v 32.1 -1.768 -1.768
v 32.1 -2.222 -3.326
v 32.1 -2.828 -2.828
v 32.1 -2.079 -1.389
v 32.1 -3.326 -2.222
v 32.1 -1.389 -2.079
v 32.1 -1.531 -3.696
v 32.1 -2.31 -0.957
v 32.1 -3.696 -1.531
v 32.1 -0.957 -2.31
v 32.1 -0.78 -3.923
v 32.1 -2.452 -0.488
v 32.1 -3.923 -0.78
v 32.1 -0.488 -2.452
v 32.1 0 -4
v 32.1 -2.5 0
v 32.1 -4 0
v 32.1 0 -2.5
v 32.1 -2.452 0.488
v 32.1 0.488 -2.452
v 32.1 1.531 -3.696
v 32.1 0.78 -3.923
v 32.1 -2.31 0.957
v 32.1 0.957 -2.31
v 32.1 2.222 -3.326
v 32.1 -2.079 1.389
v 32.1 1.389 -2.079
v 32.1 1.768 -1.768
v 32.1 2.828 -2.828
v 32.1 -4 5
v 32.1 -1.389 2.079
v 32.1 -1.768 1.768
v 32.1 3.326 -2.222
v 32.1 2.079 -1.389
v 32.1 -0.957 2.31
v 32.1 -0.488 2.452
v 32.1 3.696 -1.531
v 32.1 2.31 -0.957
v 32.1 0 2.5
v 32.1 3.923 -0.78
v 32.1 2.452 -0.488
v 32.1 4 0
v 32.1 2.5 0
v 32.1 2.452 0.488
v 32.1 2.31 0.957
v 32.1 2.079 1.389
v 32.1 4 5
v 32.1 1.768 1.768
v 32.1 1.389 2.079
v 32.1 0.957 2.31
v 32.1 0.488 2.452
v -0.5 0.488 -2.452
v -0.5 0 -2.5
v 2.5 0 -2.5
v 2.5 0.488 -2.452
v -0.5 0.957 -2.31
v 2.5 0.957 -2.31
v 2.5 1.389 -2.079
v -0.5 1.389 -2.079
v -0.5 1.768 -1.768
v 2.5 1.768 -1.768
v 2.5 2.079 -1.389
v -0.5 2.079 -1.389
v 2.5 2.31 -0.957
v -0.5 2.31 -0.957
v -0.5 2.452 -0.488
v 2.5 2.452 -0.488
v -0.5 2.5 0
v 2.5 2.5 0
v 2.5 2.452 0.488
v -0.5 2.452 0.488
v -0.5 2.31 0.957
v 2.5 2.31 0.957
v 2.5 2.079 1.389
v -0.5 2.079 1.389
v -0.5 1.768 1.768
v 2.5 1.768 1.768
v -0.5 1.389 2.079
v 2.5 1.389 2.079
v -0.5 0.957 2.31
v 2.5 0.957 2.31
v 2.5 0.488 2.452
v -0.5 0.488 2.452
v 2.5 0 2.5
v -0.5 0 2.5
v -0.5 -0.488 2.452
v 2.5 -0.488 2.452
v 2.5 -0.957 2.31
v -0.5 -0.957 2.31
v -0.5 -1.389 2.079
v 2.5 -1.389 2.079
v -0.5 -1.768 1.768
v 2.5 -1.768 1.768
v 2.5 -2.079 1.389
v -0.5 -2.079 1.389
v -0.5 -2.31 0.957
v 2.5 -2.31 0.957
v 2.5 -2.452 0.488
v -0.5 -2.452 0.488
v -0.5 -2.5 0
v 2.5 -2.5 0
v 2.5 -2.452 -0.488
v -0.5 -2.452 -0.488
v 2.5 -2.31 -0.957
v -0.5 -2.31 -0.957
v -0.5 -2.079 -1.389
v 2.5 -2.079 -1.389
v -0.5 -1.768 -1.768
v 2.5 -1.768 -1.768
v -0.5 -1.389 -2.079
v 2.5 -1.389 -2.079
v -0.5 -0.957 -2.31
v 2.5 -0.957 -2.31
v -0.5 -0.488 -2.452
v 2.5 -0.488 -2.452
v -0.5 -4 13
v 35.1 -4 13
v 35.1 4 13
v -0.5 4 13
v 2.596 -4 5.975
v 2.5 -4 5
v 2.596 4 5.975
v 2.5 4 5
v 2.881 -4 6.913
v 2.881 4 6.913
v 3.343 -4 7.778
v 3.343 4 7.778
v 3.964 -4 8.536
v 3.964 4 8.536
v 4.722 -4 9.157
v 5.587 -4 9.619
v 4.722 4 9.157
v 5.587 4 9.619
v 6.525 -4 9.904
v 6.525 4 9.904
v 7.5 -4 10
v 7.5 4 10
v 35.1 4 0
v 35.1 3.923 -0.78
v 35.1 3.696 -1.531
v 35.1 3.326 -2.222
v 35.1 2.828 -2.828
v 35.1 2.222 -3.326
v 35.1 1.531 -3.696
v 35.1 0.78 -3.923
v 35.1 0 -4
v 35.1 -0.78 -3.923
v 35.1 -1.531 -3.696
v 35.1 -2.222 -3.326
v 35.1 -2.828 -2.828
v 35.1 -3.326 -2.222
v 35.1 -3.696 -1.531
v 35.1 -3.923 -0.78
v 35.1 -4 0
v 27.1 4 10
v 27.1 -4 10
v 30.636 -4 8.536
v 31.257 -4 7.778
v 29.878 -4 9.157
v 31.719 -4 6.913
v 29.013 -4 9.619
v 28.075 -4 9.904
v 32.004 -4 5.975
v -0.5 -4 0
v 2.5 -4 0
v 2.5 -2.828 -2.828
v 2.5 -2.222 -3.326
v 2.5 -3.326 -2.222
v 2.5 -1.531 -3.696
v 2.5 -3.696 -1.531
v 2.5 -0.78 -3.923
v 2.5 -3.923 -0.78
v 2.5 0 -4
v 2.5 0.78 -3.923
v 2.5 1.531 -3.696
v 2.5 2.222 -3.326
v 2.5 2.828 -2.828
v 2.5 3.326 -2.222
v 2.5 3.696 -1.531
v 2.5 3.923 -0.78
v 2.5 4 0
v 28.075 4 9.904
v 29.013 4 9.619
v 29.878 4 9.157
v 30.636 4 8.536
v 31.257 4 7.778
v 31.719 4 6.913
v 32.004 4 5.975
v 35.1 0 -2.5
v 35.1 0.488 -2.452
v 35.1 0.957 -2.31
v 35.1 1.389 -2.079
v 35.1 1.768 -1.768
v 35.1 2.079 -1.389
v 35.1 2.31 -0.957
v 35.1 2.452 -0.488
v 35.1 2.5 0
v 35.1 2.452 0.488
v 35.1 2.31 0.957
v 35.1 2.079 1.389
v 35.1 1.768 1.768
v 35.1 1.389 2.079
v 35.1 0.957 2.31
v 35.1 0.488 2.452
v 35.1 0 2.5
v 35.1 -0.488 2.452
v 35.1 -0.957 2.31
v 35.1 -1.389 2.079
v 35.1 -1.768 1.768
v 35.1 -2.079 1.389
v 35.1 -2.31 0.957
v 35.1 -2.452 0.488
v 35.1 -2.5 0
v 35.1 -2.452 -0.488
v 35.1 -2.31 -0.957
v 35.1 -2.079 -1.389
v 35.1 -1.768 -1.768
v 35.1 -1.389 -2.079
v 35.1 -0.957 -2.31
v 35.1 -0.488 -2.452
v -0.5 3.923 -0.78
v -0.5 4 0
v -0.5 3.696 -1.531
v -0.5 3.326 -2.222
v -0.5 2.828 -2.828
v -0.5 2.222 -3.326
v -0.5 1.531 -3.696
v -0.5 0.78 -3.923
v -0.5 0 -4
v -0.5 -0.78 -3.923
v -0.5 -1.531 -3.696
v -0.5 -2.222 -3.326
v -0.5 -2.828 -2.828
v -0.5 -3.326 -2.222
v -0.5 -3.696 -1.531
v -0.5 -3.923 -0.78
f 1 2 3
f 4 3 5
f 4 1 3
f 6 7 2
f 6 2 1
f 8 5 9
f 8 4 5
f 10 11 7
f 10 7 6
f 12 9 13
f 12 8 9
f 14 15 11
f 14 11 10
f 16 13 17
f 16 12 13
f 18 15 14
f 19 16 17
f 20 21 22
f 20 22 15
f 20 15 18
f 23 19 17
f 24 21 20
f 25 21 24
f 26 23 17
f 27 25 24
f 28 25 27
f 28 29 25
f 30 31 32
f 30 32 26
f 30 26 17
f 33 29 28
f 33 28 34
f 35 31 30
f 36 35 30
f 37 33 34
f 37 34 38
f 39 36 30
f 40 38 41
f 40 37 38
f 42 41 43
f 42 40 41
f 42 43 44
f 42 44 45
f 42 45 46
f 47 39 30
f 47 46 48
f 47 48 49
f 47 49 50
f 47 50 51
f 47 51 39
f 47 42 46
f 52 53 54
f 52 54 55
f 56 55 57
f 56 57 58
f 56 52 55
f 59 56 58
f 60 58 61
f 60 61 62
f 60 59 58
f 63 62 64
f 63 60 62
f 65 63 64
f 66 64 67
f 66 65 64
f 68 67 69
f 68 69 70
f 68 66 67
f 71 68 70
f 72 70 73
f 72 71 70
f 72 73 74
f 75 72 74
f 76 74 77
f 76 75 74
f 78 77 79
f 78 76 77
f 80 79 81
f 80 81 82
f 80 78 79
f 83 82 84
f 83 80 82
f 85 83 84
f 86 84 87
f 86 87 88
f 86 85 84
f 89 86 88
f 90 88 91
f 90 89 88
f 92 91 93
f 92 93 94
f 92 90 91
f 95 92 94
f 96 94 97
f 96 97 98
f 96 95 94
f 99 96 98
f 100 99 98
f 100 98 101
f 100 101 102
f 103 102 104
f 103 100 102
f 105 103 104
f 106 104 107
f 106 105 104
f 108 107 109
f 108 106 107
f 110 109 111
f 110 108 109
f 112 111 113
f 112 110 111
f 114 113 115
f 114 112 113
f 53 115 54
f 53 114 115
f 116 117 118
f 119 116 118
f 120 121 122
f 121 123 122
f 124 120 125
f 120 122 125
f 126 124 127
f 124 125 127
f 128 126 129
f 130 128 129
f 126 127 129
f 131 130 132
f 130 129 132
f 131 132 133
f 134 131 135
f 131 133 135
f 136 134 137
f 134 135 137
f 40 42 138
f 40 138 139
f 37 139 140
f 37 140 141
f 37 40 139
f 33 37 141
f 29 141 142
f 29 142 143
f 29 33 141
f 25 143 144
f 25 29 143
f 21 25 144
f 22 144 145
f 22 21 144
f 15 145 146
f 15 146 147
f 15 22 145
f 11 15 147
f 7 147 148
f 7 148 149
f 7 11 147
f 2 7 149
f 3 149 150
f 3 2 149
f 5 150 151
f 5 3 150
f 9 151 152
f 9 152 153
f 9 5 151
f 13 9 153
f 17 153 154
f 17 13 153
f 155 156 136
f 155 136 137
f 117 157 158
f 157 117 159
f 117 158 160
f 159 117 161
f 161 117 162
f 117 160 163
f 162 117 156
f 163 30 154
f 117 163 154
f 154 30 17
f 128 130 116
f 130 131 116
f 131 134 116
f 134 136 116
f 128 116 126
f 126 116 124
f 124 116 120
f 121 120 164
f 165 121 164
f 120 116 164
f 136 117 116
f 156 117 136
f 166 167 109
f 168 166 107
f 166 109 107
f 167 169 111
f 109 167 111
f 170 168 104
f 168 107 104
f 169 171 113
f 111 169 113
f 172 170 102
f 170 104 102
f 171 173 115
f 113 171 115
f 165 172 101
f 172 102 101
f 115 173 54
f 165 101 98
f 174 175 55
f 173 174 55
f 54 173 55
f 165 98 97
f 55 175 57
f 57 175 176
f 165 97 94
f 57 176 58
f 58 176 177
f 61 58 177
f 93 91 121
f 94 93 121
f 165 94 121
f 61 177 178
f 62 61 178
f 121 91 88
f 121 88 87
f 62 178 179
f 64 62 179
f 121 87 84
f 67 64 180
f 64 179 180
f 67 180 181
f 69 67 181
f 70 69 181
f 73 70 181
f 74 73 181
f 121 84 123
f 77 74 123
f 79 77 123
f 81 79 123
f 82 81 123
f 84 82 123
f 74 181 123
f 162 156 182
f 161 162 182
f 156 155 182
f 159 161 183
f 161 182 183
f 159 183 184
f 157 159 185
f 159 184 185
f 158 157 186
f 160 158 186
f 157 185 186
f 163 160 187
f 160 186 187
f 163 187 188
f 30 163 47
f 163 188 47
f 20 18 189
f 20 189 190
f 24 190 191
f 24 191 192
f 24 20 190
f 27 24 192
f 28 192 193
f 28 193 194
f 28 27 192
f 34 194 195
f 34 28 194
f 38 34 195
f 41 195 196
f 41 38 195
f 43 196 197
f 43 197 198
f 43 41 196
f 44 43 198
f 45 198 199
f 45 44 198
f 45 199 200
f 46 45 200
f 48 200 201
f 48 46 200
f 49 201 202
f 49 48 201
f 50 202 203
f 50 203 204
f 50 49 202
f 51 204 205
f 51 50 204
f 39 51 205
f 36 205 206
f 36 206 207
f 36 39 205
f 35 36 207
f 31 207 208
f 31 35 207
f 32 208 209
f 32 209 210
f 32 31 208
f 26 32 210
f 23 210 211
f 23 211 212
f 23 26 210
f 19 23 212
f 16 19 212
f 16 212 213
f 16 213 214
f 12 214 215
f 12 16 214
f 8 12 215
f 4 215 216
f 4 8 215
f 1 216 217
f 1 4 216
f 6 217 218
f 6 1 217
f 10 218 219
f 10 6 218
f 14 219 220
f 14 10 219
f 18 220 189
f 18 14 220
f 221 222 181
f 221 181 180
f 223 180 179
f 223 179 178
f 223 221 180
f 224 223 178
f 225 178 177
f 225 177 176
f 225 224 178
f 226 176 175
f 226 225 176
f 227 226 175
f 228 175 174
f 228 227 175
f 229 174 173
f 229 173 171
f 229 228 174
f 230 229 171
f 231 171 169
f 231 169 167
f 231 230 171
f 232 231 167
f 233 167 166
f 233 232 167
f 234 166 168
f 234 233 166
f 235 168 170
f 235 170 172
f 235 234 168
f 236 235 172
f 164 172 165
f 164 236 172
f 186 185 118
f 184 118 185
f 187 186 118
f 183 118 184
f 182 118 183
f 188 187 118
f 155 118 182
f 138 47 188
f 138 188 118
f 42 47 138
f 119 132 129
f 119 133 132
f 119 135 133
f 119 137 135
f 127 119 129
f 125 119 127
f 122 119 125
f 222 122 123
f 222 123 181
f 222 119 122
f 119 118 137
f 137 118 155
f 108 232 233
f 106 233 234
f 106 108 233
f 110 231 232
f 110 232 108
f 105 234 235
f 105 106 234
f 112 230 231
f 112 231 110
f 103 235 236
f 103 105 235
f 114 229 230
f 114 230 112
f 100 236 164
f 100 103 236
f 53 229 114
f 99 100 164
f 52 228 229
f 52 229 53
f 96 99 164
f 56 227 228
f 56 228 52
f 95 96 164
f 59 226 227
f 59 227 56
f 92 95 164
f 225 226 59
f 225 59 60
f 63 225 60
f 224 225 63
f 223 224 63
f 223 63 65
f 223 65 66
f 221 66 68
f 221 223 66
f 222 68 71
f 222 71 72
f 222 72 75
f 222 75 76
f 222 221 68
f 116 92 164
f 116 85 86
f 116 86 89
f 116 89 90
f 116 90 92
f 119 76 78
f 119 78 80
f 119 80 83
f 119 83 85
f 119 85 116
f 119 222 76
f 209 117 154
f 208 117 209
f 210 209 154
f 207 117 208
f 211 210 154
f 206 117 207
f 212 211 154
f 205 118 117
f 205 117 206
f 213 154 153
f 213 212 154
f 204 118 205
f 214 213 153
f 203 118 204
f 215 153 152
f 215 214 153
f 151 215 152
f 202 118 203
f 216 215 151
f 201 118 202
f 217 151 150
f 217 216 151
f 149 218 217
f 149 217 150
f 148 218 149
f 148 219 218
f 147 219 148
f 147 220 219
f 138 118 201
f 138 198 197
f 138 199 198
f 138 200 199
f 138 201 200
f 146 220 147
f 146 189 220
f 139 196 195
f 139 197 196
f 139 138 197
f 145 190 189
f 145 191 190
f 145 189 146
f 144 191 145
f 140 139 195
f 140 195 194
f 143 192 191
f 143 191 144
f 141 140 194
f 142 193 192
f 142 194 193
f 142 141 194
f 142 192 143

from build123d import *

# Parameters (mm, degrees)
BOSS_EXTRUDE1_START = -0.5
SKETCH2_W           = 3
SKETCH2_H           = 8
SKETCH2_R           = 2.5
BOSS_EXTRUDE1_DEPTH = 3
BOSS_EXTRUDE2_START = 2.5
SKETCH2_3_W         = 3
SKETCH2_3_H         = 8
BOSS_EXTRUDE2_DEPTH = 29.6
BOSS_EXTRUDE3_START = 32.1
SKETCH2_4_W         = 3
SKETCH2_4_H         = 8
SKETCH2_4_R         = 2.5
BOSS_EXTRUDE3_DEPTH = 3
FILLET1_R           = 5


with BuildPart() as part:
    # Sketch2 → Boss-Extrude1 (new body)
    # profile 1 of 2: a face of its own
    with BuildSketch(Plane(origin=(0, 0, 0), x_dir=(0, 0, -1), z_dir=(1, 0, 0)).offset(BOSS_EXTRUDE1_START)):
        with Locations((-11.5, 0)):
            Rectangle(SKETCH2_W, SKETCH2_H)
    # profile 2 of 2: a face of its own
    with BuildSketch(Plane(origin=(0, 0, 0), x_dir=(0, 0, -1), z_dir=(1, 0, 0)).offset(BOSS_EXTRUDE1_START)):
        with BuildLine():
            Line((0, -4), (-10, -4))
            Line((-10, -4), (-10, 4))
            Line((-10, 4), (0, 4))
            ThreePointArc((0, 4), (4, 0), (0, -4))
        make_face()
        Circle(SKETCH2_R, mode=Mode.SUBTRACT)
    extrude(amount=BOSS_EXTRUDE1_DEPTH)

    # Sketch2<3> → Boss-Extrude2 (add)
    with BuildSketch(Plane(origin=(0, 0, 0), x_dir=(0, 0, -1), z_dir=(1, 0, 0)).offset(BOSS_EXTRUDE2_START)):
        with Locations((-11.5, 0)):
            Rectangle(SKETCH2_3_W, SKETCH2_3_H)
    extrude(amount=BOSS_EXTRUDE2_DEPTH)

    # Sketch2<4> → Boss-Extrude3 (add)
    # profile 1 of 2: a face of its own
    with BuildSketch(Plane(origin=(0, 0, 0), x_dir=(0, 0, -1), z_dir=(1, 0, 0)).offset(BOSS_EXTRUDE3_START)):
        with Locations((-11.5, 0)):
            Rectangle(SKETCH2_4_W, SKETCH2_4_H)
    # profile 2 of 2: a face of its own
    with BuildSketch(Plane(origin=(0, 0, 0), x_dir=(0, 0, -1), z_dir=(1, 0, 0)).offset(BOSS_EXTRUDE3_START)):
        with BuildLine():
            Line((0, -4), (-10, -4))
            Line((-10, -4), (-10, 4))
            Line((-10, 4), (0, 4))
            ThreePointArc((0, 4), (4, 0), (0, -4))
        make_face()
        Circle(SKETCH2_4_R, mode=Mode.SUBTRACT)
    extrude(amount=BOSS_EXTRUDE3_DEPTH)

    # Fillet1
    fillet1_edges = [part.edges().sort_by_distance(p)[0] for p in [
        (32.1, 0, 10),
        (2.5, 0, 10),
    ]]
    fillet(fillet1_edges, radius=FILLET1_R)


solid = part.part
